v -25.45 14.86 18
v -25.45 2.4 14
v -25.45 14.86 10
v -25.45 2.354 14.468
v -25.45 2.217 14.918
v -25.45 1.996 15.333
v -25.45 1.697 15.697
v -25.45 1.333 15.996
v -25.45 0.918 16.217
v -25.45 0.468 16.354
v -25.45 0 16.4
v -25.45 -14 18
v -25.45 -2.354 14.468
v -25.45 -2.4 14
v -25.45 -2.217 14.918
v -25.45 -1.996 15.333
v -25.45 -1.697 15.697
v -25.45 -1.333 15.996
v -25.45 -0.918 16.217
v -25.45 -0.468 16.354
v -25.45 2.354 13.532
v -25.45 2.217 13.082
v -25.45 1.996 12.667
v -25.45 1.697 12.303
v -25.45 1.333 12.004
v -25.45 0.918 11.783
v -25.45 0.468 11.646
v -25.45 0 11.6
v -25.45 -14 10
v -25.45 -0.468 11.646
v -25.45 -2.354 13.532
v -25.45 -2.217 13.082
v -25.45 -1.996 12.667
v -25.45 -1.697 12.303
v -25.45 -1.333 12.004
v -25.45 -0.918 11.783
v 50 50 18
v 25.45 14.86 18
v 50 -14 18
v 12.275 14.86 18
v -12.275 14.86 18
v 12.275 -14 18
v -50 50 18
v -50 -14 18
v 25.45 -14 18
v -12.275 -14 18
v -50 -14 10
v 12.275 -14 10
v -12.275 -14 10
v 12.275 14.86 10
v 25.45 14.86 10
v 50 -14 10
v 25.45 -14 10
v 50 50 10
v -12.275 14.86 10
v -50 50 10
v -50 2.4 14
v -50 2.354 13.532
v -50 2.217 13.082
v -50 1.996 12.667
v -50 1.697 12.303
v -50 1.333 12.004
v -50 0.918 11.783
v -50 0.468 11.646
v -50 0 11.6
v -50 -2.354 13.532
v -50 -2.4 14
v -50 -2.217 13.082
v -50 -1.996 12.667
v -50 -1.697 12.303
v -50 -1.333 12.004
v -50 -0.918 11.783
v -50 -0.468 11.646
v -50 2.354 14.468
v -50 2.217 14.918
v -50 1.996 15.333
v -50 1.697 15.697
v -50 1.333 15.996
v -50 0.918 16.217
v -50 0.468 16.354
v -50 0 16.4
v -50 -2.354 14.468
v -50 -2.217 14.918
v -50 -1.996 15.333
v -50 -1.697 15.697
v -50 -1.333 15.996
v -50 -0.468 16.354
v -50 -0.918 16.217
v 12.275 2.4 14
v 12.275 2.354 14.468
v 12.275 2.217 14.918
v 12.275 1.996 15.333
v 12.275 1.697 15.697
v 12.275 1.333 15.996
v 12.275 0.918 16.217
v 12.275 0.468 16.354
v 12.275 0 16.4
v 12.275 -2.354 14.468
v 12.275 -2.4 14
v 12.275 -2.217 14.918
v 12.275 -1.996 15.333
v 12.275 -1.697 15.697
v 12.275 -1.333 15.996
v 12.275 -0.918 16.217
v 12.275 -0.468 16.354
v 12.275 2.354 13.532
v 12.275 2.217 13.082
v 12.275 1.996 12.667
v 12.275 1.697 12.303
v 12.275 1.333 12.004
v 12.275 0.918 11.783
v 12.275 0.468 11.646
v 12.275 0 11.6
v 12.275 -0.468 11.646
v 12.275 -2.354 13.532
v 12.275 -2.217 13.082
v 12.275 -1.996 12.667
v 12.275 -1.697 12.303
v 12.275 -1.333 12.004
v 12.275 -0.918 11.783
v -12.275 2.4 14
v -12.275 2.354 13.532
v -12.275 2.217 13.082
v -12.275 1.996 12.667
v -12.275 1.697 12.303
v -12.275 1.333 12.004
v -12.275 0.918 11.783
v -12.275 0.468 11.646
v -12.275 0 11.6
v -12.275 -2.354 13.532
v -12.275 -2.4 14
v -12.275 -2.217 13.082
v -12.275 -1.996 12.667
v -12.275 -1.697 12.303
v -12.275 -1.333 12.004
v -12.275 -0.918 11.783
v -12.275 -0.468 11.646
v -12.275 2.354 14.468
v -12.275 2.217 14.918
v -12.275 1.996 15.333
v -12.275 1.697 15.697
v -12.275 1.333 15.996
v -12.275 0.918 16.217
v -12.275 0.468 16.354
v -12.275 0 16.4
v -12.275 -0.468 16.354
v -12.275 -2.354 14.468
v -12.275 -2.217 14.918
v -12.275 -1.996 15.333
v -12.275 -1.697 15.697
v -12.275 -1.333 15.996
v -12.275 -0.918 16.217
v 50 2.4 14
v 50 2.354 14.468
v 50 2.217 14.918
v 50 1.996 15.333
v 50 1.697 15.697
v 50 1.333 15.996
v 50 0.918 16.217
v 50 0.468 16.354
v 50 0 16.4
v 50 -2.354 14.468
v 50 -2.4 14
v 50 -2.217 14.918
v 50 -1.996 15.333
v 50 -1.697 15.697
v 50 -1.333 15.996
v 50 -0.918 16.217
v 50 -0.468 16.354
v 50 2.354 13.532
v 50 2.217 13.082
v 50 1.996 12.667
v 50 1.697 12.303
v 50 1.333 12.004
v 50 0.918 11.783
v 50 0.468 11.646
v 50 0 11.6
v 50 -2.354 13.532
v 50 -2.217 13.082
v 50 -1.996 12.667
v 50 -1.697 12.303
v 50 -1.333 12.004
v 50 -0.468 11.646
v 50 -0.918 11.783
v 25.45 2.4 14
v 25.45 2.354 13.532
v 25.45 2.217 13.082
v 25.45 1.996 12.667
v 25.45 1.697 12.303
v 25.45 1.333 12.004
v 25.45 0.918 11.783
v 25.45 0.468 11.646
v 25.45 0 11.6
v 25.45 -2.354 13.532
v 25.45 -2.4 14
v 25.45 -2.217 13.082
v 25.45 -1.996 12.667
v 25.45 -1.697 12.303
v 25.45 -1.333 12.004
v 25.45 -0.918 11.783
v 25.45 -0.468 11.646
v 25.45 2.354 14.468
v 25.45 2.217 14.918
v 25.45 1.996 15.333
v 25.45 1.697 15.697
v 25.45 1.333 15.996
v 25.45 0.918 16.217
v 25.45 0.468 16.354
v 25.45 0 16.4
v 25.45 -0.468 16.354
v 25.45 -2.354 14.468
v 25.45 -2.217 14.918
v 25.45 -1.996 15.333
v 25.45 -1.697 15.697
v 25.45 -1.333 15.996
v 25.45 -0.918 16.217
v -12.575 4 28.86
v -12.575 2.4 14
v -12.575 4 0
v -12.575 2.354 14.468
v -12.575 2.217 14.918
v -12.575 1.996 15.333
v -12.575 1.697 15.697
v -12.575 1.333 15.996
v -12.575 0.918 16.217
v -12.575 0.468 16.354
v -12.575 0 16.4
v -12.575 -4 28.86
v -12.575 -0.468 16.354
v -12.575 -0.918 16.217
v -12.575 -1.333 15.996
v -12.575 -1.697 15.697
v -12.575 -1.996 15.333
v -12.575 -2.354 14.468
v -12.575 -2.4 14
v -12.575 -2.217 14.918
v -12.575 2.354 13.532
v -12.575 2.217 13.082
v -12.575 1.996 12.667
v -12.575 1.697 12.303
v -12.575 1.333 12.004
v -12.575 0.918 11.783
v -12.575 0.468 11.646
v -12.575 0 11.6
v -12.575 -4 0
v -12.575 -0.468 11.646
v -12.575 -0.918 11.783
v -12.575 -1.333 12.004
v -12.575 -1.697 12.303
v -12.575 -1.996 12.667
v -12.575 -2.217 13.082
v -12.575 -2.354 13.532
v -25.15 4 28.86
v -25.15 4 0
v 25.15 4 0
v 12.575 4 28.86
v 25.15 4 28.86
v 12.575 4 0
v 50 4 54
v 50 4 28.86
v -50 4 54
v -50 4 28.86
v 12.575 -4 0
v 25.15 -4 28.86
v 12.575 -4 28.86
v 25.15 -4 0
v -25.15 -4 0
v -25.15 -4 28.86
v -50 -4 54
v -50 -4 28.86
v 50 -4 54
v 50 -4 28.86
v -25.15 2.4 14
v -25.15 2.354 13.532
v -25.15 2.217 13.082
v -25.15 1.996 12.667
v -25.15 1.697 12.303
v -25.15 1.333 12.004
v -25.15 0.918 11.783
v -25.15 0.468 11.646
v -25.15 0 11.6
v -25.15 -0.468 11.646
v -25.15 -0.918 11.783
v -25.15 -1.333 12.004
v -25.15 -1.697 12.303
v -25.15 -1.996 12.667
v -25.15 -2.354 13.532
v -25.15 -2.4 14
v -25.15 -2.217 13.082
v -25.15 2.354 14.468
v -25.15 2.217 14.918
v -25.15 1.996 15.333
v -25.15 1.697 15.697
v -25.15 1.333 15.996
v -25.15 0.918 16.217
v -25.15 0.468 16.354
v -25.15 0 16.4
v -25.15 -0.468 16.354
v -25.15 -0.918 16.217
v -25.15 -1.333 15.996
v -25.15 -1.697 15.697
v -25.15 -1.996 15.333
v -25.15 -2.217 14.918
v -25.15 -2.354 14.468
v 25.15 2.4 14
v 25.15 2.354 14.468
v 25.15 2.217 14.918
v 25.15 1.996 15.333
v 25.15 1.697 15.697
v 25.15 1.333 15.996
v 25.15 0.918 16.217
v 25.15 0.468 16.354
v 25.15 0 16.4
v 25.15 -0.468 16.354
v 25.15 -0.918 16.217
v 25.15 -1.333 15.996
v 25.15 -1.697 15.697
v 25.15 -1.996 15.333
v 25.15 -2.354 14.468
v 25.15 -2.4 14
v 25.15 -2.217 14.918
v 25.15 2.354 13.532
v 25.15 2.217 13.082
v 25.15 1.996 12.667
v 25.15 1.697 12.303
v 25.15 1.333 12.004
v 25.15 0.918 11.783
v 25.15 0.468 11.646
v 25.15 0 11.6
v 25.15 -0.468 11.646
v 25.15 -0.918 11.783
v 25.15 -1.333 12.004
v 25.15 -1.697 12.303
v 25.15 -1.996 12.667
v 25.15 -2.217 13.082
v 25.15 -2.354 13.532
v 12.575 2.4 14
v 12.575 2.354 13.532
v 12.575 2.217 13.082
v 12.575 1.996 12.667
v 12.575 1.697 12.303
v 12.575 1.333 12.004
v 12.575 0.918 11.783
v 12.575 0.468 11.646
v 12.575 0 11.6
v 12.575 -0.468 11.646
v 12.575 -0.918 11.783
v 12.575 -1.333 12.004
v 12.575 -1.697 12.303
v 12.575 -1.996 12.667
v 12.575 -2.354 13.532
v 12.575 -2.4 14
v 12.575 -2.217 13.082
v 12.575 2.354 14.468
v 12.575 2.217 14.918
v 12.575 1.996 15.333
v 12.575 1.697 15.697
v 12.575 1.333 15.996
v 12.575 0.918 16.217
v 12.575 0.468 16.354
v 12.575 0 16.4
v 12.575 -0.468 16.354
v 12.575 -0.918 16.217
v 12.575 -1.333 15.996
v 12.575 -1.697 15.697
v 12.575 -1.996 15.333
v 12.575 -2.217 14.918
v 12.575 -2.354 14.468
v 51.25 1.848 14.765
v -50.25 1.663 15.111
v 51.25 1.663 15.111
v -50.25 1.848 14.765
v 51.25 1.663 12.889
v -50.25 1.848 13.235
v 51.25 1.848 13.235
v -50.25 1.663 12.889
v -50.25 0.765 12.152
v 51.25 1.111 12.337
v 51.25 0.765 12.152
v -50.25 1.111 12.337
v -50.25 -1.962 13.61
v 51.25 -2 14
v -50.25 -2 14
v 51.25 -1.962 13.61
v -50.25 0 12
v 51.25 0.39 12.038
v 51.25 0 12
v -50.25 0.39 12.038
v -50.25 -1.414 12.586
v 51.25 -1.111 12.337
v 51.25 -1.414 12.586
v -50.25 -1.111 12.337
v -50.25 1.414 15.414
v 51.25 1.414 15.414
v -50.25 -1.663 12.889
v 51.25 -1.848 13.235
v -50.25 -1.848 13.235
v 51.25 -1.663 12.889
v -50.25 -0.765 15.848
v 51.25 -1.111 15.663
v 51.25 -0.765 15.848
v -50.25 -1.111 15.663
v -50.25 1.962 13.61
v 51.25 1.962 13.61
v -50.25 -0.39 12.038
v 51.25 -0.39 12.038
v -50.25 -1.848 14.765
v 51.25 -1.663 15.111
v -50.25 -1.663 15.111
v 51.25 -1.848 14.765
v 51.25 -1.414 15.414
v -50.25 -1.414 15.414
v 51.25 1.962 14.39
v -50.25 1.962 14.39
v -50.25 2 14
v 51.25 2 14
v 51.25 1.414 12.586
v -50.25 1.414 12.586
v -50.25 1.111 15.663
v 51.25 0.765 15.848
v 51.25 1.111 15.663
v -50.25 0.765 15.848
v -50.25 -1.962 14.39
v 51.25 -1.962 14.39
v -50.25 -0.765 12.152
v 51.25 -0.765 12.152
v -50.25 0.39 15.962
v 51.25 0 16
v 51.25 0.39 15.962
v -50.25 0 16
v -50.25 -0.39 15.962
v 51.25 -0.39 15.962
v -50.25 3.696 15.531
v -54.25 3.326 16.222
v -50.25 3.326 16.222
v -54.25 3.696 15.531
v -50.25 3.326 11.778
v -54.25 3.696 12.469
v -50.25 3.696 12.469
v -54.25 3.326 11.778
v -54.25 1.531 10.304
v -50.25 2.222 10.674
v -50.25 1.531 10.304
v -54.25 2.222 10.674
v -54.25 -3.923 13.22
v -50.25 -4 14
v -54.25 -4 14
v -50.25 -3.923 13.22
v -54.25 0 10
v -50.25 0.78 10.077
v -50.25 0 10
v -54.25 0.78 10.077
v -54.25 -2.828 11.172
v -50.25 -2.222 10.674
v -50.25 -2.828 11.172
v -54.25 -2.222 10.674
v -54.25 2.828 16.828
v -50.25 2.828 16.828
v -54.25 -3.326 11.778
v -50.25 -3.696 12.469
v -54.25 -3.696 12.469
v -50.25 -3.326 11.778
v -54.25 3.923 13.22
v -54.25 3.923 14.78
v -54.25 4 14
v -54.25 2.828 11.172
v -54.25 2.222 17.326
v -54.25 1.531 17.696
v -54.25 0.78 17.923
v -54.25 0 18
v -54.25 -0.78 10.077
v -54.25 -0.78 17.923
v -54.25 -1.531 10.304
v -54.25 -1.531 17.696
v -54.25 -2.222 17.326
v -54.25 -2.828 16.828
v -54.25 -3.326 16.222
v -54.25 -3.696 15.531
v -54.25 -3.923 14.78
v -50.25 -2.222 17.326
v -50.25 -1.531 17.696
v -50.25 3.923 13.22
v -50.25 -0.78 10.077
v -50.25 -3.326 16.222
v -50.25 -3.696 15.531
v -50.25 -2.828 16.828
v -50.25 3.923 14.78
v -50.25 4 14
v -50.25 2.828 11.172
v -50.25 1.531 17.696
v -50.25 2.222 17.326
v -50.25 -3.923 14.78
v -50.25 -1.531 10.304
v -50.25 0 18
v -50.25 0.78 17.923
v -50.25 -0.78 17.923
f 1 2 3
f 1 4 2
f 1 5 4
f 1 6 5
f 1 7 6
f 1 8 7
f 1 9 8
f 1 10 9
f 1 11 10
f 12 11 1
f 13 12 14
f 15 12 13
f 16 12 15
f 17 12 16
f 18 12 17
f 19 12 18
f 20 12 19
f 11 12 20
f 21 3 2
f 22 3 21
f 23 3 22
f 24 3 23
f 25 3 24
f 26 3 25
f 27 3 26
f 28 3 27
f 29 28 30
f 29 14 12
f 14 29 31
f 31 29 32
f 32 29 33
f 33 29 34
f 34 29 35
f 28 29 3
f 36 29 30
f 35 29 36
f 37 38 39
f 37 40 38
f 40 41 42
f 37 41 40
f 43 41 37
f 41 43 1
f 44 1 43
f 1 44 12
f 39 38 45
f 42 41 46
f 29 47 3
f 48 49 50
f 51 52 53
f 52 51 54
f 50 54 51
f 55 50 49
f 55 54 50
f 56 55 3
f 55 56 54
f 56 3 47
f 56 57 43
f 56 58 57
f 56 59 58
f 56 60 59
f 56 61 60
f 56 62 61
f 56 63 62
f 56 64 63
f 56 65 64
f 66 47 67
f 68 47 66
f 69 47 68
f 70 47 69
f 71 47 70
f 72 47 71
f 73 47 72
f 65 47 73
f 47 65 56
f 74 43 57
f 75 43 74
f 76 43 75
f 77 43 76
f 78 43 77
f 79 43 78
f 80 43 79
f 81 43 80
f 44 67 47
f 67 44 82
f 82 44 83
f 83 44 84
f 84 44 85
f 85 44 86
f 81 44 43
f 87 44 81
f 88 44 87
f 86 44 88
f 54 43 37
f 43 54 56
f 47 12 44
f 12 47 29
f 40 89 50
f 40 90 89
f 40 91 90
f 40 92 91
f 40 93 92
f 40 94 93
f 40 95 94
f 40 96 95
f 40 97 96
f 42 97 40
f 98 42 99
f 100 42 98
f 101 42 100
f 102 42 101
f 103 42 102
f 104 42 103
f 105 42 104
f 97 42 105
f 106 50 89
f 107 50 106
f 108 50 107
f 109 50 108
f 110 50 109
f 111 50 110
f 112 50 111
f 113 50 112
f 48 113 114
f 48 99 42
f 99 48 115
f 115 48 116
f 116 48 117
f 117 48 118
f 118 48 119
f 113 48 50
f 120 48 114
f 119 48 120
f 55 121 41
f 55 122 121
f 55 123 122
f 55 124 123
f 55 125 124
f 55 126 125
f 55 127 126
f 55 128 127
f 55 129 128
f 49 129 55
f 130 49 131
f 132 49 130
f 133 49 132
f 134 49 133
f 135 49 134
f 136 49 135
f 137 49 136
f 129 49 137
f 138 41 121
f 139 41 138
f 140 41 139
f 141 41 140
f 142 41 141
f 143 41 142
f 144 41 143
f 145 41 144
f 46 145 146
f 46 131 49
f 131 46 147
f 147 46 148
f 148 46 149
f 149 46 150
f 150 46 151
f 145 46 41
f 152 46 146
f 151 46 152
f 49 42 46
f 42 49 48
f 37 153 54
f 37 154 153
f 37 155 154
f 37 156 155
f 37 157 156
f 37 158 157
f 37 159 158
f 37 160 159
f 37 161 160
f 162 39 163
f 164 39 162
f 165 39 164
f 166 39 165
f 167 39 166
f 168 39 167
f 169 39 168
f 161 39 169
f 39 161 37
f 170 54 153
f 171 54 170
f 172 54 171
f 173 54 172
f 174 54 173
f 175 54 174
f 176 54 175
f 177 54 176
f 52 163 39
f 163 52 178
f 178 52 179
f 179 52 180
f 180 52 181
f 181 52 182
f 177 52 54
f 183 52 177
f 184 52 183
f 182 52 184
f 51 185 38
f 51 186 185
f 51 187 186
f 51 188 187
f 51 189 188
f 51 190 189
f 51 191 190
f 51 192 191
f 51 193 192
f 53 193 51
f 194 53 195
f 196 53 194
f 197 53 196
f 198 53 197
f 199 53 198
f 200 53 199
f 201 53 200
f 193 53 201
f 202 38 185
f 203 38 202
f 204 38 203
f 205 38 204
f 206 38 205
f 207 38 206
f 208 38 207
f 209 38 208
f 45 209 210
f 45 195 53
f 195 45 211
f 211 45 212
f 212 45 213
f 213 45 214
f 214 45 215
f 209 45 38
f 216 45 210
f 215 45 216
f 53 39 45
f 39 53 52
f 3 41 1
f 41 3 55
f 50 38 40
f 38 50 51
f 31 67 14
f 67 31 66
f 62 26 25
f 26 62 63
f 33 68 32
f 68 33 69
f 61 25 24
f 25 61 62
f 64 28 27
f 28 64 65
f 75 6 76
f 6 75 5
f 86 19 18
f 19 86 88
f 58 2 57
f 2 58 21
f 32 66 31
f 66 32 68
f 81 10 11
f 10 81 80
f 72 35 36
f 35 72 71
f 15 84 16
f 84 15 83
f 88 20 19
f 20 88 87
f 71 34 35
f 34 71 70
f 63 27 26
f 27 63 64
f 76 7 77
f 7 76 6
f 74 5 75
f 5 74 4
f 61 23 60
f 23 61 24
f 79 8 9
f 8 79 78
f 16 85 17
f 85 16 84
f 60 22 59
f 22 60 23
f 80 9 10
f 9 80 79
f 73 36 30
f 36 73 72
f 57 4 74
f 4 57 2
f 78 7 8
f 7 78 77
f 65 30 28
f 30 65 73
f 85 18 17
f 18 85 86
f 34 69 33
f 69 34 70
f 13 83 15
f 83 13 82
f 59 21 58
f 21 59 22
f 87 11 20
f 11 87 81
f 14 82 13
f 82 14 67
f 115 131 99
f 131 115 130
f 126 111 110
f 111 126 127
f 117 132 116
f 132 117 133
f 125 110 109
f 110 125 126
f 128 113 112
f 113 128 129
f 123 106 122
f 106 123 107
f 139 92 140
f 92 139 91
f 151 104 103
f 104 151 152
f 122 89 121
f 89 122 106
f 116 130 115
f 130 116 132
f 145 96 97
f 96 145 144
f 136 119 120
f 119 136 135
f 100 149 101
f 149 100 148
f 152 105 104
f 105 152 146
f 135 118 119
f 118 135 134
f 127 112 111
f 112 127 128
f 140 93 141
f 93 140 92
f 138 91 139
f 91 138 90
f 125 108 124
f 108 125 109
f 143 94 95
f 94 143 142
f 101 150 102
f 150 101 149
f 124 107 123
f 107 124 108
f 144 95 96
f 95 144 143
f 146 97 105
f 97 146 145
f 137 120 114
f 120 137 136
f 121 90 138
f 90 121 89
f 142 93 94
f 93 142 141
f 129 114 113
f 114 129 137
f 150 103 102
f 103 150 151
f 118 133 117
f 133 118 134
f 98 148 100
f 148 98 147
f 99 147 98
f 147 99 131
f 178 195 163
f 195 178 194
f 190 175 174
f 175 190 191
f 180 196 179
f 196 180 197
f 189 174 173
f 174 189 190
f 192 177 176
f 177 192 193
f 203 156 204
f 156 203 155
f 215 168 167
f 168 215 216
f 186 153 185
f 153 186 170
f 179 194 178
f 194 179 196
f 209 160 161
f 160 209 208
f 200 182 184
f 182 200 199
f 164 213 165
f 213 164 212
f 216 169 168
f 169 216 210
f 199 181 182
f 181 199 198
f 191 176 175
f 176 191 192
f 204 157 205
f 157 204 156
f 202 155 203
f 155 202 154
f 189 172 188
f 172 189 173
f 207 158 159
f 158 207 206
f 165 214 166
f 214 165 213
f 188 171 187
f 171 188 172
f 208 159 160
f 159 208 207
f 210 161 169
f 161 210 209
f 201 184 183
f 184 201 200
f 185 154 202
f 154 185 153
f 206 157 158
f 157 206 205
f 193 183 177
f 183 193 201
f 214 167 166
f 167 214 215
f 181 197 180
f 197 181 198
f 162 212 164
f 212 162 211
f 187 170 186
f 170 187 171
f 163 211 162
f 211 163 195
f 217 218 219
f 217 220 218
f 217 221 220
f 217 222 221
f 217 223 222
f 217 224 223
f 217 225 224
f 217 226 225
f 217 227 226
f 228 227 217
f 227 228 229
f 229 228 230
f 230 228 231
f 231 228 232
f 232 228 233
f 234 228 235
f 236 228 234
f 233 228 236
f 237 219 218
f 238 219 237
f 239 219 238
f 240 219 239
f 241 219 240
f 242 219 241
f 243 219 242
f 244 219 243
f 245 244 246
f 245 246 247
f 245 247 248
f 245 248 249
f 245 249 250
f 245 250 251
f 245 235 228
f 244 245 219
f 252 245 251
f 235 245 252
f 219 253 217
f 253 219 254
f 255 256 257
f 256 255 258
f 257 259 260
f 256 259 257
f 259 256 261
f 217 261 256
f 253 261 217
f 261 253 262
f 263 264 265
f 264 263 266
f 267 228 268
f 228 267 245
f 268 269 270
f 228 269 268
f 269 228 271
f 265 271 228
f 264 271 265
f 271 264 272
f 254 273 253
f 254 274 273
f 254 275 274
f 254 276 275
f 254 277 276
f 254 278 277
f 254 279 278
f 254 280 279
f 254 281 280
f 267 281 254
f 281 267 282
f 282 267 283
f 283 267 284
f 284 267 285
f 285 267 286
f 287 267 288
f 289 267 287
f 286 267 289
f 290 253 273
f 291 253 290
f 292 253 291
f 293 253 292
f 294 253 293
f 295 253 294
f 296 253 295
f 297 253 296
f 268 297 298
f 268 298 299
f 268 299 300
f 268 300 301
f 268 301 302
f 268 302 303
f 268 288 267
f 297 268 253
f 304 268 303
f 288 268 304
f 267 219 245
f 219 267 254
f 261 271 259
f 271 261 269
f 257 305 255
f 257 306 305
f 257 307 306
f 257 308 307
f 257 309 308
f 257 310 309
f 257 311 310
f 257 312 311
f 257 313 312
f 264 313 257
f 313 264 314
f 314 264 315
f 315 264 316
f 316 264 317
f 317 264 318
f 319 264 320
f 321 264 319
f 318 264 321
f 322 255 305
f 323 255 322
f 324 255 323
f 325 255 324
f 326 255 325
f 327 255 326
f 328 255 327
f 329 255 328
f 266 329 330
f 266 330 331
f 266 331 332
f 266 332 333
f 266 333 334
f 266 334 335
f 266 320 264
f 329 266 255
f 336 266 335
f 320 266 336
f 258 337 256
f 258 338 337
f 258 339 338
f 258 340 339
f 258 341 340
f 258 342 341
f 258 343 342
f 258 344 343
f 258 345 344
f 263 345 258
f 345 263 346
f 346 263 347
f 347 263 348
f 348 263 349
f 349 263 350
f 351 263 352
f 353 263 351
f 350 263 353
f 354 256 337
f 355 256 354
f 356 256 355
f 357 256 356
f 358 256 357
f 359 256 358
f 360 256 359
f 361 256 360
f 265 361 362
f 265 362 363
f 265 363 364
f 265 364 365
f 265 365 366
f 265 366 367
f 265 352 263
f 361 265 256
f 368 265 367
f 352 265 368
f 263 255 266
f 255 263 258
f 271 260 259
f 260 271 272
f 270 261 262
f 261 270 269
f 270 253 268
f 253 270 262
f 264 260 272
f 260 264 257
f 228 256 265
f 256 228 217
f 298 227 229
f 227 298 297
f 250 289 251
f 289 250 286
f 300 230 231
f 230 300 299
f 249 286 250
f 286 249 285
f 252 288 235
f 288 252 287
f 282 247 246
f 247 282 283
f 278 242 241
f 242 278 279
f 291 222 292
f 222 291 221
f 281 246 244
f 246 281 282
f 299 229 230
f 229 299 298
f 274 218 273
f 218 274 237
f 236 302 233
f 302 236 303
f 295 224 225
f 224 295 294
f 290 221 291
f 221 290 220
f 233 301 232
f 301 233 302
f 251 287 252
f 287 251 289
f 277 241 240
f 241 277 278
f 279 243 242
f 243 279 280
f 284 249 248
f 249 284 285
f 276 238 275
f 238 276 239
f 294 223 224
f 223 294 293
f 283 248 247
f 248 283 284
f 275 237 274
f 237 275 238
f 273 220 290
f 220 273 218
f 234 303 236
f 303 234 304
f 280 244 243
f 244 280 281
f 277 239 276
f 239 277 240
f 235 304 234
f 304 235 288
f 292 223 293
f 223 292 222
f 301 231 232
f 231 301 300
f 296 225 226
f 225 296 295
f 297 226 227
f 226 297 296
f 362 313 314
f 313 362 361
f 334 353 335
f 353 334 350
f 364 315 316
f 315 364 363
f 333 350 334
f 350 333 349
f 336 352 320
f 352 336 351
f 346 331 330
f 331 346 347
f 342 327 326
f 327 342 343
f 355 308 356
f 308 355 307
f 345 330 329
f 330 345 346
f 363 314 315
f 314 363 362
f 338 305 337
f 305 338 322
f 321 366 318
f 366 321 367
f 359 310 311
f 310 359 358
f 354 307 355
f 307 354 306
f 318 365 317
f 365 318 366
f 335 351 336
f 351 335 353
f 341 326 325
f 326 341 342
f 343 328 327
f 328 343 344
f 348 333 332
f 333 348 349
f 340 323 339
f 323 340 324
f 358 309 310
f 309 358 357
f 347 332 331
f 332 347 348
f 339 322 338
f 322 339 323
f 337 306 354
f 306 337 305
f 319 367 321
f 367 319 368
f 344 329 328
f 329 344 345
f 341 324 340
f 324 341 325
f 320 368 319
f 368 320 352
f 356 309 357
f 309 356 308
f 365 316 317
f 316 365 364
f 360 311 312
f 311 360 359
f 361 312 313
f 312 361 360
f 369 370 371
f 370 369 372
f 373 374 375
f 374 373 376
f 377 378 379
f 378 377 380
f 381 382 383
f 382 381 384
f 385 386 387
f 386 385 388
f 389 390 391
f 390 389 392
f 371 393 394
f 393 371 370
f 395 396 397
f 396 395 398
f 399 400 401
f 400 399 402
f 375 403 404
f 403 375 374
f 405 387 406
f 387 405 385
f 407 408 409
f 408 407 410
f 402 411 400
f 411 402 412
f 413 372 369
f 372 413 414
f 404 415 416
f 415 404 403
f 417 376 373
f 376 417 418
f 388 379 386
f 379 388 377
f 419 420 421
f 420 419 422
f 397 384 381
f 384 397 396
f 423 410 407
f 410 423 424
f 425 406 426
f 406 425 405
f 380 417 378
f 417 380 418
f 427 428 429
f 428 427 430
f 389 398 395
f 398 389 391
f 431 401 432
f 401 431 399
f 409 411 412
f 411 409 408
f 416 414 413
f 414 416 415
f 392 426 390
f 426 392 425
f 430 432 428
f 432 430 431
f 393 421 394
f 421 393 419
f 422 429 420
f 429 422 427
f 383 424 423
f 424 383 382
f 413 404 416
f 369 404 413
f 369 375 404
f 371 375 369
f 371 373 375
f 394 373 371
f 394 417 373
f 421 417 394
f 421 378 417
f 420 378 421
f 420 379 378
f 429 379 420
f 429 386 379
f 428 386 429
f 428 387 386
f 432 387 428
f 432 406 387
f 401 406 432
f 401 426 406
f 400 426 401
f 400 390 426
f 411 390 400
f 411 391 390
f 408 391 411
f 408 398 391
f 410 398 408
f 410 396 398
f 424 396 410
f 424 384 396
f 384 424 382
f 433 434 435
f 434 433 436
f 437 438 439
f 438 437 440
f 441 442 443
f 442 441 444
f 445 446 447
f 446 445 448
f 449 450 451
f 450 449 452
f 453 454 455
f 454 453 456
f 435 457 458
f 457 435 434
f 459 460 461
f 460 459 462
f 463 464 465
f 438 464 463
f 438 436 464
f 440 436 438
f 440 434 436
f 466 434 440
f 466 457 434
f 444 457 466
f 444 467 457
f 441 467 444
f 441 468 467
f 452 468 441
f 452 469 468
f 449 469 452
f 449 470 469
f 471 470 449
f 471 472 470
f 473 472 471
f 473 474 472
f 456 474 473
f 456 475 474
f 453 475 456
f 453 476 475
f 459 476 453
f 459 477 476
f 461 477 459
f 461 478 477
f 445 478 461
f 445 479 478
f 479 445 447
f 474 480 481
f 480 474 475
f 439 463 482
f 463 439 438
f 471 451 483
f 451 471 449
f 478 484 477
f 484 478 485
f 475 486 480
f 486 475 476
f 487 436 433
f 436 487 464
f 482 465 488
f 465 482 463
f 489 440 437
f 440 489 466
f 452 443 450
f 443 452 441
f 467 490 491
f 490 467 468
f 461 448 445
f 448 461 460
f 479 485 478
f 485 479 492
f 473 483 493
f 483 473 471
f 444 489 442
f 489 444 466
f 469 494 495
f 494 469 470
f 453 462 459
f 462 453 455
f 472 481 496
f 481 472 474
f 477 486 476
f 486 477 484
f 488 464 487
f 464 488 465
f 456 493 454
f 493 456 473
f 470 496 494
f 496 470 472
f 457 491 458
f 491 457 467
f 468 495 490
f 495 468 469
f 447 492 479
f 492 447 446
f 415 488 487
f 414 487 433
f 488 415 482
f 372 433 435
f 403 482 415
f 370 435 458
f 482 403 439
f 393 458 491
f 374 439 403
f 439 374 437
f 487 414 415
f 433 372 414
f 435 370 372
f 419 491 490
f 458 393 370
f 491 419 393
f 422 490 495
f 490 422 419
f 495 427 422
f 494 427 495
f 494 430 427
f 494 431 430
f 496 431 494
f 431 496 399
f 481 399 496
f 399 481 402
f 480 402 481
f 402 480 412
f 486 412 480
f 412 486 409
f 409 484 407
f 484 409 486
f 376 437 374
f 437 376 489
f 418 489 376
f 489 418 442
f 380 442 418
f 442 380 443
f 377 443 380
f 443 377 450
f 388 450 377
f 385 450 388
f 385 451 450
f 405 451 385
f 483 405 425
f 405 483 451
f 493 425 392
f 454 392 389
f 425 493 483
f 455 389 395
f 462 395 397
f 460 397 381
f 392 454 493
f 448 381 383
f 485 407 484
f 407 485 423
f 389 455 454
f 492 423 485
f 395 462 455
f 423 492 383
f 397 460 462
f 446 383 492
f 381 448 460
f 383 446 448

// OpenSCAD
$fn = 32;

// ------------------------------------------------------------------------
// Butt hinge: hinge 100 mm, leaf swung 270 deg
// Every part is its own module, assembly() places every instance.
// ------------------------------------------------------------------------

// --- part 1 ---
module hinge_base() {
  difference() {
    union() {
      translate([-50, -14, -4]) cube([24.55, 64, 8]);
      translate([-12.275, -14, -4]) cube([24.55, 64, 8]);
      translate([25.45, -14, -4]) cube([24.55, 64, 8]);
      translate([-50, 14.86, -4]) cube([100, 35.14, 8]);
    }
    translate([-37.725, 0, 0]) rotate([0, 90, 0]) cylinder(h = 26.55, d = 4.8, center = true);
    translate([0, 0, 0]) rotate([0, 90, 0]) cylinder(h = 26.55, d = 4.8, center = true);
    translate([37.725, 0, 0]) rotate([0, 90, 0]) cylinder(h = 26.55, d = 4.8, center = true);
  }
}

// --- part 2 ---
module hinge_mover() {
  difference() {
    union() {
      translate([-25.15, -40, -4]) cube([12.575, 54, 8]);
      translate([12.575, -40, -4]) cube([12.575, 54, 8]);
      translate([-50, -40, -4]) cube([100, 25.14, 8]);
    }
    translate([-18.863, 0, 0]) rotate([0, 90, 0]) cylinder(h = 14.575, d = 4.8, center = true);
    translate([18.863, 0, 0]) rotate([0, 90, 0]) cylinder(h = 14.575, d = 4.8, center = true);
  }
}

// --- part 3 ---
module hinge_pin() {
  rotate([0, 90, 0]) cylinder(h = 102.5, d = 4, center = true);
  translate([-54.25, 0, 0]) rotate([0, 90, 0]) cylinder(h = 4, d = 8);
}

// --- assembly ---
module assembly() {
  color([0.80, 0.24, 0.20]) translate([0, 0, 14]) rotate([0, 0, 0]) hinge_base();
  color([0.20, 0.45, 0.75]) translate([0, 0, 14]) rotate([270, 0, 0]) hinge_mover();
  color([0.25, 0.62, 0.32]) translate([0, 0, 14]) rotate([0, 0, 0]) hinge_pin();
}

assembly();
